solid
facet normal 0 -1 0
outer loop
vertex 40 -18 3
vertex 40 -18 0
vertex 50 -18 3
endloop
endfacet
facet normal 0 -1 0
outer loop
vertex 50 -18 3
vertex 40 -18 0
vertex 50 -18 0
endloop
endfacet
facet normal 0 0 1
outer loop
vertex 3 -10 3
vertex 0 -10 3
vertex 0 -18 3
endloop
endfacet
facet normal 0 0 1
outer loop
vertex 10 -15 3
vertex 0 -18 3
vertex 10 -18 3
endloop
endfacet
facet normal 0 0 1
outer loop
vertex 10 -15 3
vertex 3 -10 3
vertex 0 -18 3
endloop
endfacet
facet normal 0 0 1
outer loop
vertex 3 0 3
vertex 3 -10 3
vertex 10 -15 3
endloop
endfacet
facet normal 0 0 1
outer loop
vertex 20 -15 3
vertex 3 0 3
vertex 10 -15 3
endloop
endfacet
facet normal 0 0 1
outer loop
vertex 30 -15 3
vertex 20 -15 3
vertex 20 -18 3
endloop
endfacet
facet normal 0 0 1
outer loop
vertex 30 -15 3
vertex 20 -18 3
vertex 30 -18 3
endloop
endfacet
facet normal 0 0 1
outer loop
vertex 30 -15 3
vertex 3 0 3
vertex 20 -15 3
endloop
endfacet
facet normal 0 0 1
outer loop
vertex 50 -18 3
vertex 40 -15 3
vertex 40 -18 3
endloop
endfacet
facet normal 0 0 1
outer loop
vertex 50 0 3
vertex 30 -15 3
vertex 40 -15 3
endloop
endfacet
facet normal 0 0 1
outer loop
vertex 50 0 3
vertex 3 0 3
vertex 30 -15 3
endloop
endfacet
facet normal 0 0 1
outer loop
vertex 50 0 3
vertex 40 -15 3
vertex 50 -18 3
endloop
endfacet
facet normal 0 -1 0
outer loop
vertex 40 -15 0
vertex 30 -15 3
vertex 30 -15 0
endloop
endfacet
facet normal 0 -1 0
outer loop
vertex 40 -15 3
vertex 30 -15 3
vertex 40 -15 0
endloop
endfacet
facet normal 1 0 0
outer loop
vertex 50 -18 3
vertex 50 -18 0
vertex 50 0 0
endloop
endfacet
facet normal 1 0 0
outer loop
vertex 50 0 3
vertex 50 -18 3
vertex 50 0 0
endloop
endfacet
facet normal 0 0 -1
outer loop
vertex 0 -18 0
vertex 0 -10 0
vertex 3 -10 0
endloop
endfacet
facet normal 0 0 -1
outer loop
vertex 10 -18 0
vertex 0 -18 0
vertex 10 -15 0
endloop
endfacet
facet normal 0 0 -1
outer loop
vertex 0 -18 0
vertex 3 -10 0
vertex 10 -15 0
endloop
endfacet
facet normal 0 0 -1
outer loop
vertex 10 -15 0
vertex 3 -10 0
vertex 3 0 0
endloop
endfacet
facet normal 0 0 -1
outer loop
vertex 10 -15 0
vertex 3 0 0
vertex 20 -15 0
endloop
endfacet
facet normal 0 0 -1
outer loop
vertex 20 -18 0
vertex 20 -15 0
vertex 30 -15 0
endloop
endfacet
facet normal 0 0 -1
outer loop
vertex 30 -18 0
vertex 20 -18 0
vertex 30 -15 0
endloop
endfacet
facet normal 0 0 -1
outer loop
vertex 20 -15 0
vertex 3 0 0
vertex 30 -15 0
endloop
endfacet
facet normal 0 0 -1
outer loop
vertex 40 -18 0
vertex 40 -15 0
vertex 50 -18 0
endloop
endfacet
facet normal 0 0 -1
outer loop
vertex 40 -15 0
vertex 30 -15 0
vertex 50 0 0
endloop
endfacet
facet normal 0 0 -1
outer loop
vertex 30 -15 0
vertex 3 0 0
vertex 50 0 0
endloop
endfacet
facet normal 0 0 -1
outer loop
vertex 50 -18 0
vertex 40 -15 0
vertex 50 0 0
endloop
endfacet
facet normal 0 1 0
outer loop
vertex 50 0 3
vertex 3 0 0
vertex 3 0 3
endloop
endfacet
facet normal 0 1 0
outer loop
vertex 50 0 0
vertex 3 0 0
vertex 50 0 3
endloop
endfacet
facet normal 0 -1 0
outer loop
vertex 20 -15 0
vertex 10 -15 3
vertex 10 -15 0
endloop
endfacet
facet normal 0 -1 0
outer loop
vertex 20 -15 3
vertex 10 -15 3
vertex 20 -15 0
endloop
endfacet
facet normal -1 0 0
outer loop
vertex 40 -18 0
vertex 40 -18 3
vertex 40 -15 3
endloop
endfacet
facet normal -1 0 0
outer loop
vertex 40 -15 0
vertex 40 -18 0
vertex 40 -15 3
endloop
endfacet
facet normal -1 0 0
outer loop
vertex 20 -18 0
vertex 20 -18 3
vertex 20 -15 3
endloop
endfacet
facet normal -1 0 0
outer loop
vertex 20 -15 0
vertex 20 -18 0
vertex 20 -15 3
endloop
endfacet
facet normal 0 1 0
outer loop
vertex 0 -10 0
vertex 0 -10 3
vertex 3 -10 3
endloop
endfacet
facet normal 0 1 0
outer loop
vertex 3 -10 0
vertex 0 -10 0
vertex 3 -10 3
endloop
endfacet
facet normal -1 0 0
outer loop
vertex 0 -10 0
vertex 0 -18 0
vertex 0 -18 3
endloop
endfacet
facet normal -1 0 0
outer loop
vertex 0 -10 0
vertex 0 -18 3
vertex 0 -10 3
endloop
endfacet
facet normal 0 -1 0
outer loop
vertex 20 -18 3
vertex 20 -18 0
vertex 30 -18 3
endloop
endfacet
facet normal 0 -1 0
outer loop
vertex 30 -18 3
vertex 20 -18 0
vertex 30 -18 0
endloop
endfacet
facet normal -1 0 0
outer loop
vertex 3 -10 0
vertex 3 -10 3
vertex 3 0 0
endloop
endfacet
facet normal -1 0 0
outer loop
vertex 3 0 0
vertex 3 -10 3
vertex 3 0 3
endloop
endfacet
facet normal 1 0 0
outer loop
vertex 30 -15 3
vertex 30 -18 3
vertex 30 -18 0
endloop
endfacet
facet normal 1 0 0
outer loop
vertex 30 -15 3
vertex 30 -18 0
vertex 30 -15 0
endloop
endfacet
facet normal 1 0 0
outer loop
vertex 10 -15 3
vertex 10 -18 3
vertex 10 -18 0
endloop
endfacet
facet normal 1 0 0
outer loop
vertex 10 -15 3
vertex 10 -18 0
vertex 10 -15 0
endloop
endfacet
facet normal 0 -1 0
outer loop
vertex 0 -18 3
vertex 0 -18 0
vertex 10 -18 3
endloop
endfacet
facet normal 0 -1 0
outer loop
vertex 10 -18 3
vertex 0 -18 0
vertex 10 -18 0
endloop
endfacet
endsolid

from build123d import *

# Parameters (mm, degrees)
ESQUISSE1_W                = 50
ESQUISSE1_H                = 18
BOSS_EXTRU_1_DEPTH         = 3
ESQUISSE2_W                = 10
ESQUISSE2_H                = 3
ENL_V_MAT_EXTRU_1_DEPTH    = 3
R_P_TITION_LIN_AIRE1_COUNT = 2
R_P_TITION_LIN_AIRE1_PITCH = 20
ESQUISSE3_W                = 3
ESQUISSE3_H                = 10
ENL_V_MAT_EXTRU_2_DEPTH    = 3


with BuildPart() as part:
    # Esquisse1 → Boss.-Extru.1 (new body)
    with BuildSketch(Plane.XY):
        with Locations((25, -9)):
            Rectangle(ESQUISSE1_W, ESQUISSE1_H)
    extrude(amount=BOSS_EXTRU_1_DEPTH)

    # Esquisse2 → Enlèv. mat.-Extru.1 (cut)
    with BuildSketch(Plane.XY.offset(3)):
        with Locations((35, -16.5)):
            Rectangle(ESQUISSE2_W, ESQUISSE2_H)
    enl_v_mat_extru_1 = extrude(amount=-ENL_V_MAT_EXTRU_1_DEPTH, mode=Mode.SUBTRACT)

    # Répétition linéaire1: Enlèv. mat.-Extru.1 ×2
    with Locations(*[(-i * R_P_TITION_LIN_AIRE1_PITCH, 0, 0) for i in range(1, R_P_TITION_LIN_AIRE1_COUNT)]):
        add(enl_v_mat_extru_1, mode=Mode.SUBTRACT)

    # Esquisse3 → Enlèv. mat.-Extru.2 (cut)
    with BuildSketch(Plane.XY.offset(3)):
        with Locations((1.5, -5)):
            Rectangle(ESQUISSE3_W, ESQUISSE3_H)
    extrude(amount=-ENL_V_MAT_EXTRU_2_DEPTH, mode=Mode.SUBTRACT)


solid = part.part
